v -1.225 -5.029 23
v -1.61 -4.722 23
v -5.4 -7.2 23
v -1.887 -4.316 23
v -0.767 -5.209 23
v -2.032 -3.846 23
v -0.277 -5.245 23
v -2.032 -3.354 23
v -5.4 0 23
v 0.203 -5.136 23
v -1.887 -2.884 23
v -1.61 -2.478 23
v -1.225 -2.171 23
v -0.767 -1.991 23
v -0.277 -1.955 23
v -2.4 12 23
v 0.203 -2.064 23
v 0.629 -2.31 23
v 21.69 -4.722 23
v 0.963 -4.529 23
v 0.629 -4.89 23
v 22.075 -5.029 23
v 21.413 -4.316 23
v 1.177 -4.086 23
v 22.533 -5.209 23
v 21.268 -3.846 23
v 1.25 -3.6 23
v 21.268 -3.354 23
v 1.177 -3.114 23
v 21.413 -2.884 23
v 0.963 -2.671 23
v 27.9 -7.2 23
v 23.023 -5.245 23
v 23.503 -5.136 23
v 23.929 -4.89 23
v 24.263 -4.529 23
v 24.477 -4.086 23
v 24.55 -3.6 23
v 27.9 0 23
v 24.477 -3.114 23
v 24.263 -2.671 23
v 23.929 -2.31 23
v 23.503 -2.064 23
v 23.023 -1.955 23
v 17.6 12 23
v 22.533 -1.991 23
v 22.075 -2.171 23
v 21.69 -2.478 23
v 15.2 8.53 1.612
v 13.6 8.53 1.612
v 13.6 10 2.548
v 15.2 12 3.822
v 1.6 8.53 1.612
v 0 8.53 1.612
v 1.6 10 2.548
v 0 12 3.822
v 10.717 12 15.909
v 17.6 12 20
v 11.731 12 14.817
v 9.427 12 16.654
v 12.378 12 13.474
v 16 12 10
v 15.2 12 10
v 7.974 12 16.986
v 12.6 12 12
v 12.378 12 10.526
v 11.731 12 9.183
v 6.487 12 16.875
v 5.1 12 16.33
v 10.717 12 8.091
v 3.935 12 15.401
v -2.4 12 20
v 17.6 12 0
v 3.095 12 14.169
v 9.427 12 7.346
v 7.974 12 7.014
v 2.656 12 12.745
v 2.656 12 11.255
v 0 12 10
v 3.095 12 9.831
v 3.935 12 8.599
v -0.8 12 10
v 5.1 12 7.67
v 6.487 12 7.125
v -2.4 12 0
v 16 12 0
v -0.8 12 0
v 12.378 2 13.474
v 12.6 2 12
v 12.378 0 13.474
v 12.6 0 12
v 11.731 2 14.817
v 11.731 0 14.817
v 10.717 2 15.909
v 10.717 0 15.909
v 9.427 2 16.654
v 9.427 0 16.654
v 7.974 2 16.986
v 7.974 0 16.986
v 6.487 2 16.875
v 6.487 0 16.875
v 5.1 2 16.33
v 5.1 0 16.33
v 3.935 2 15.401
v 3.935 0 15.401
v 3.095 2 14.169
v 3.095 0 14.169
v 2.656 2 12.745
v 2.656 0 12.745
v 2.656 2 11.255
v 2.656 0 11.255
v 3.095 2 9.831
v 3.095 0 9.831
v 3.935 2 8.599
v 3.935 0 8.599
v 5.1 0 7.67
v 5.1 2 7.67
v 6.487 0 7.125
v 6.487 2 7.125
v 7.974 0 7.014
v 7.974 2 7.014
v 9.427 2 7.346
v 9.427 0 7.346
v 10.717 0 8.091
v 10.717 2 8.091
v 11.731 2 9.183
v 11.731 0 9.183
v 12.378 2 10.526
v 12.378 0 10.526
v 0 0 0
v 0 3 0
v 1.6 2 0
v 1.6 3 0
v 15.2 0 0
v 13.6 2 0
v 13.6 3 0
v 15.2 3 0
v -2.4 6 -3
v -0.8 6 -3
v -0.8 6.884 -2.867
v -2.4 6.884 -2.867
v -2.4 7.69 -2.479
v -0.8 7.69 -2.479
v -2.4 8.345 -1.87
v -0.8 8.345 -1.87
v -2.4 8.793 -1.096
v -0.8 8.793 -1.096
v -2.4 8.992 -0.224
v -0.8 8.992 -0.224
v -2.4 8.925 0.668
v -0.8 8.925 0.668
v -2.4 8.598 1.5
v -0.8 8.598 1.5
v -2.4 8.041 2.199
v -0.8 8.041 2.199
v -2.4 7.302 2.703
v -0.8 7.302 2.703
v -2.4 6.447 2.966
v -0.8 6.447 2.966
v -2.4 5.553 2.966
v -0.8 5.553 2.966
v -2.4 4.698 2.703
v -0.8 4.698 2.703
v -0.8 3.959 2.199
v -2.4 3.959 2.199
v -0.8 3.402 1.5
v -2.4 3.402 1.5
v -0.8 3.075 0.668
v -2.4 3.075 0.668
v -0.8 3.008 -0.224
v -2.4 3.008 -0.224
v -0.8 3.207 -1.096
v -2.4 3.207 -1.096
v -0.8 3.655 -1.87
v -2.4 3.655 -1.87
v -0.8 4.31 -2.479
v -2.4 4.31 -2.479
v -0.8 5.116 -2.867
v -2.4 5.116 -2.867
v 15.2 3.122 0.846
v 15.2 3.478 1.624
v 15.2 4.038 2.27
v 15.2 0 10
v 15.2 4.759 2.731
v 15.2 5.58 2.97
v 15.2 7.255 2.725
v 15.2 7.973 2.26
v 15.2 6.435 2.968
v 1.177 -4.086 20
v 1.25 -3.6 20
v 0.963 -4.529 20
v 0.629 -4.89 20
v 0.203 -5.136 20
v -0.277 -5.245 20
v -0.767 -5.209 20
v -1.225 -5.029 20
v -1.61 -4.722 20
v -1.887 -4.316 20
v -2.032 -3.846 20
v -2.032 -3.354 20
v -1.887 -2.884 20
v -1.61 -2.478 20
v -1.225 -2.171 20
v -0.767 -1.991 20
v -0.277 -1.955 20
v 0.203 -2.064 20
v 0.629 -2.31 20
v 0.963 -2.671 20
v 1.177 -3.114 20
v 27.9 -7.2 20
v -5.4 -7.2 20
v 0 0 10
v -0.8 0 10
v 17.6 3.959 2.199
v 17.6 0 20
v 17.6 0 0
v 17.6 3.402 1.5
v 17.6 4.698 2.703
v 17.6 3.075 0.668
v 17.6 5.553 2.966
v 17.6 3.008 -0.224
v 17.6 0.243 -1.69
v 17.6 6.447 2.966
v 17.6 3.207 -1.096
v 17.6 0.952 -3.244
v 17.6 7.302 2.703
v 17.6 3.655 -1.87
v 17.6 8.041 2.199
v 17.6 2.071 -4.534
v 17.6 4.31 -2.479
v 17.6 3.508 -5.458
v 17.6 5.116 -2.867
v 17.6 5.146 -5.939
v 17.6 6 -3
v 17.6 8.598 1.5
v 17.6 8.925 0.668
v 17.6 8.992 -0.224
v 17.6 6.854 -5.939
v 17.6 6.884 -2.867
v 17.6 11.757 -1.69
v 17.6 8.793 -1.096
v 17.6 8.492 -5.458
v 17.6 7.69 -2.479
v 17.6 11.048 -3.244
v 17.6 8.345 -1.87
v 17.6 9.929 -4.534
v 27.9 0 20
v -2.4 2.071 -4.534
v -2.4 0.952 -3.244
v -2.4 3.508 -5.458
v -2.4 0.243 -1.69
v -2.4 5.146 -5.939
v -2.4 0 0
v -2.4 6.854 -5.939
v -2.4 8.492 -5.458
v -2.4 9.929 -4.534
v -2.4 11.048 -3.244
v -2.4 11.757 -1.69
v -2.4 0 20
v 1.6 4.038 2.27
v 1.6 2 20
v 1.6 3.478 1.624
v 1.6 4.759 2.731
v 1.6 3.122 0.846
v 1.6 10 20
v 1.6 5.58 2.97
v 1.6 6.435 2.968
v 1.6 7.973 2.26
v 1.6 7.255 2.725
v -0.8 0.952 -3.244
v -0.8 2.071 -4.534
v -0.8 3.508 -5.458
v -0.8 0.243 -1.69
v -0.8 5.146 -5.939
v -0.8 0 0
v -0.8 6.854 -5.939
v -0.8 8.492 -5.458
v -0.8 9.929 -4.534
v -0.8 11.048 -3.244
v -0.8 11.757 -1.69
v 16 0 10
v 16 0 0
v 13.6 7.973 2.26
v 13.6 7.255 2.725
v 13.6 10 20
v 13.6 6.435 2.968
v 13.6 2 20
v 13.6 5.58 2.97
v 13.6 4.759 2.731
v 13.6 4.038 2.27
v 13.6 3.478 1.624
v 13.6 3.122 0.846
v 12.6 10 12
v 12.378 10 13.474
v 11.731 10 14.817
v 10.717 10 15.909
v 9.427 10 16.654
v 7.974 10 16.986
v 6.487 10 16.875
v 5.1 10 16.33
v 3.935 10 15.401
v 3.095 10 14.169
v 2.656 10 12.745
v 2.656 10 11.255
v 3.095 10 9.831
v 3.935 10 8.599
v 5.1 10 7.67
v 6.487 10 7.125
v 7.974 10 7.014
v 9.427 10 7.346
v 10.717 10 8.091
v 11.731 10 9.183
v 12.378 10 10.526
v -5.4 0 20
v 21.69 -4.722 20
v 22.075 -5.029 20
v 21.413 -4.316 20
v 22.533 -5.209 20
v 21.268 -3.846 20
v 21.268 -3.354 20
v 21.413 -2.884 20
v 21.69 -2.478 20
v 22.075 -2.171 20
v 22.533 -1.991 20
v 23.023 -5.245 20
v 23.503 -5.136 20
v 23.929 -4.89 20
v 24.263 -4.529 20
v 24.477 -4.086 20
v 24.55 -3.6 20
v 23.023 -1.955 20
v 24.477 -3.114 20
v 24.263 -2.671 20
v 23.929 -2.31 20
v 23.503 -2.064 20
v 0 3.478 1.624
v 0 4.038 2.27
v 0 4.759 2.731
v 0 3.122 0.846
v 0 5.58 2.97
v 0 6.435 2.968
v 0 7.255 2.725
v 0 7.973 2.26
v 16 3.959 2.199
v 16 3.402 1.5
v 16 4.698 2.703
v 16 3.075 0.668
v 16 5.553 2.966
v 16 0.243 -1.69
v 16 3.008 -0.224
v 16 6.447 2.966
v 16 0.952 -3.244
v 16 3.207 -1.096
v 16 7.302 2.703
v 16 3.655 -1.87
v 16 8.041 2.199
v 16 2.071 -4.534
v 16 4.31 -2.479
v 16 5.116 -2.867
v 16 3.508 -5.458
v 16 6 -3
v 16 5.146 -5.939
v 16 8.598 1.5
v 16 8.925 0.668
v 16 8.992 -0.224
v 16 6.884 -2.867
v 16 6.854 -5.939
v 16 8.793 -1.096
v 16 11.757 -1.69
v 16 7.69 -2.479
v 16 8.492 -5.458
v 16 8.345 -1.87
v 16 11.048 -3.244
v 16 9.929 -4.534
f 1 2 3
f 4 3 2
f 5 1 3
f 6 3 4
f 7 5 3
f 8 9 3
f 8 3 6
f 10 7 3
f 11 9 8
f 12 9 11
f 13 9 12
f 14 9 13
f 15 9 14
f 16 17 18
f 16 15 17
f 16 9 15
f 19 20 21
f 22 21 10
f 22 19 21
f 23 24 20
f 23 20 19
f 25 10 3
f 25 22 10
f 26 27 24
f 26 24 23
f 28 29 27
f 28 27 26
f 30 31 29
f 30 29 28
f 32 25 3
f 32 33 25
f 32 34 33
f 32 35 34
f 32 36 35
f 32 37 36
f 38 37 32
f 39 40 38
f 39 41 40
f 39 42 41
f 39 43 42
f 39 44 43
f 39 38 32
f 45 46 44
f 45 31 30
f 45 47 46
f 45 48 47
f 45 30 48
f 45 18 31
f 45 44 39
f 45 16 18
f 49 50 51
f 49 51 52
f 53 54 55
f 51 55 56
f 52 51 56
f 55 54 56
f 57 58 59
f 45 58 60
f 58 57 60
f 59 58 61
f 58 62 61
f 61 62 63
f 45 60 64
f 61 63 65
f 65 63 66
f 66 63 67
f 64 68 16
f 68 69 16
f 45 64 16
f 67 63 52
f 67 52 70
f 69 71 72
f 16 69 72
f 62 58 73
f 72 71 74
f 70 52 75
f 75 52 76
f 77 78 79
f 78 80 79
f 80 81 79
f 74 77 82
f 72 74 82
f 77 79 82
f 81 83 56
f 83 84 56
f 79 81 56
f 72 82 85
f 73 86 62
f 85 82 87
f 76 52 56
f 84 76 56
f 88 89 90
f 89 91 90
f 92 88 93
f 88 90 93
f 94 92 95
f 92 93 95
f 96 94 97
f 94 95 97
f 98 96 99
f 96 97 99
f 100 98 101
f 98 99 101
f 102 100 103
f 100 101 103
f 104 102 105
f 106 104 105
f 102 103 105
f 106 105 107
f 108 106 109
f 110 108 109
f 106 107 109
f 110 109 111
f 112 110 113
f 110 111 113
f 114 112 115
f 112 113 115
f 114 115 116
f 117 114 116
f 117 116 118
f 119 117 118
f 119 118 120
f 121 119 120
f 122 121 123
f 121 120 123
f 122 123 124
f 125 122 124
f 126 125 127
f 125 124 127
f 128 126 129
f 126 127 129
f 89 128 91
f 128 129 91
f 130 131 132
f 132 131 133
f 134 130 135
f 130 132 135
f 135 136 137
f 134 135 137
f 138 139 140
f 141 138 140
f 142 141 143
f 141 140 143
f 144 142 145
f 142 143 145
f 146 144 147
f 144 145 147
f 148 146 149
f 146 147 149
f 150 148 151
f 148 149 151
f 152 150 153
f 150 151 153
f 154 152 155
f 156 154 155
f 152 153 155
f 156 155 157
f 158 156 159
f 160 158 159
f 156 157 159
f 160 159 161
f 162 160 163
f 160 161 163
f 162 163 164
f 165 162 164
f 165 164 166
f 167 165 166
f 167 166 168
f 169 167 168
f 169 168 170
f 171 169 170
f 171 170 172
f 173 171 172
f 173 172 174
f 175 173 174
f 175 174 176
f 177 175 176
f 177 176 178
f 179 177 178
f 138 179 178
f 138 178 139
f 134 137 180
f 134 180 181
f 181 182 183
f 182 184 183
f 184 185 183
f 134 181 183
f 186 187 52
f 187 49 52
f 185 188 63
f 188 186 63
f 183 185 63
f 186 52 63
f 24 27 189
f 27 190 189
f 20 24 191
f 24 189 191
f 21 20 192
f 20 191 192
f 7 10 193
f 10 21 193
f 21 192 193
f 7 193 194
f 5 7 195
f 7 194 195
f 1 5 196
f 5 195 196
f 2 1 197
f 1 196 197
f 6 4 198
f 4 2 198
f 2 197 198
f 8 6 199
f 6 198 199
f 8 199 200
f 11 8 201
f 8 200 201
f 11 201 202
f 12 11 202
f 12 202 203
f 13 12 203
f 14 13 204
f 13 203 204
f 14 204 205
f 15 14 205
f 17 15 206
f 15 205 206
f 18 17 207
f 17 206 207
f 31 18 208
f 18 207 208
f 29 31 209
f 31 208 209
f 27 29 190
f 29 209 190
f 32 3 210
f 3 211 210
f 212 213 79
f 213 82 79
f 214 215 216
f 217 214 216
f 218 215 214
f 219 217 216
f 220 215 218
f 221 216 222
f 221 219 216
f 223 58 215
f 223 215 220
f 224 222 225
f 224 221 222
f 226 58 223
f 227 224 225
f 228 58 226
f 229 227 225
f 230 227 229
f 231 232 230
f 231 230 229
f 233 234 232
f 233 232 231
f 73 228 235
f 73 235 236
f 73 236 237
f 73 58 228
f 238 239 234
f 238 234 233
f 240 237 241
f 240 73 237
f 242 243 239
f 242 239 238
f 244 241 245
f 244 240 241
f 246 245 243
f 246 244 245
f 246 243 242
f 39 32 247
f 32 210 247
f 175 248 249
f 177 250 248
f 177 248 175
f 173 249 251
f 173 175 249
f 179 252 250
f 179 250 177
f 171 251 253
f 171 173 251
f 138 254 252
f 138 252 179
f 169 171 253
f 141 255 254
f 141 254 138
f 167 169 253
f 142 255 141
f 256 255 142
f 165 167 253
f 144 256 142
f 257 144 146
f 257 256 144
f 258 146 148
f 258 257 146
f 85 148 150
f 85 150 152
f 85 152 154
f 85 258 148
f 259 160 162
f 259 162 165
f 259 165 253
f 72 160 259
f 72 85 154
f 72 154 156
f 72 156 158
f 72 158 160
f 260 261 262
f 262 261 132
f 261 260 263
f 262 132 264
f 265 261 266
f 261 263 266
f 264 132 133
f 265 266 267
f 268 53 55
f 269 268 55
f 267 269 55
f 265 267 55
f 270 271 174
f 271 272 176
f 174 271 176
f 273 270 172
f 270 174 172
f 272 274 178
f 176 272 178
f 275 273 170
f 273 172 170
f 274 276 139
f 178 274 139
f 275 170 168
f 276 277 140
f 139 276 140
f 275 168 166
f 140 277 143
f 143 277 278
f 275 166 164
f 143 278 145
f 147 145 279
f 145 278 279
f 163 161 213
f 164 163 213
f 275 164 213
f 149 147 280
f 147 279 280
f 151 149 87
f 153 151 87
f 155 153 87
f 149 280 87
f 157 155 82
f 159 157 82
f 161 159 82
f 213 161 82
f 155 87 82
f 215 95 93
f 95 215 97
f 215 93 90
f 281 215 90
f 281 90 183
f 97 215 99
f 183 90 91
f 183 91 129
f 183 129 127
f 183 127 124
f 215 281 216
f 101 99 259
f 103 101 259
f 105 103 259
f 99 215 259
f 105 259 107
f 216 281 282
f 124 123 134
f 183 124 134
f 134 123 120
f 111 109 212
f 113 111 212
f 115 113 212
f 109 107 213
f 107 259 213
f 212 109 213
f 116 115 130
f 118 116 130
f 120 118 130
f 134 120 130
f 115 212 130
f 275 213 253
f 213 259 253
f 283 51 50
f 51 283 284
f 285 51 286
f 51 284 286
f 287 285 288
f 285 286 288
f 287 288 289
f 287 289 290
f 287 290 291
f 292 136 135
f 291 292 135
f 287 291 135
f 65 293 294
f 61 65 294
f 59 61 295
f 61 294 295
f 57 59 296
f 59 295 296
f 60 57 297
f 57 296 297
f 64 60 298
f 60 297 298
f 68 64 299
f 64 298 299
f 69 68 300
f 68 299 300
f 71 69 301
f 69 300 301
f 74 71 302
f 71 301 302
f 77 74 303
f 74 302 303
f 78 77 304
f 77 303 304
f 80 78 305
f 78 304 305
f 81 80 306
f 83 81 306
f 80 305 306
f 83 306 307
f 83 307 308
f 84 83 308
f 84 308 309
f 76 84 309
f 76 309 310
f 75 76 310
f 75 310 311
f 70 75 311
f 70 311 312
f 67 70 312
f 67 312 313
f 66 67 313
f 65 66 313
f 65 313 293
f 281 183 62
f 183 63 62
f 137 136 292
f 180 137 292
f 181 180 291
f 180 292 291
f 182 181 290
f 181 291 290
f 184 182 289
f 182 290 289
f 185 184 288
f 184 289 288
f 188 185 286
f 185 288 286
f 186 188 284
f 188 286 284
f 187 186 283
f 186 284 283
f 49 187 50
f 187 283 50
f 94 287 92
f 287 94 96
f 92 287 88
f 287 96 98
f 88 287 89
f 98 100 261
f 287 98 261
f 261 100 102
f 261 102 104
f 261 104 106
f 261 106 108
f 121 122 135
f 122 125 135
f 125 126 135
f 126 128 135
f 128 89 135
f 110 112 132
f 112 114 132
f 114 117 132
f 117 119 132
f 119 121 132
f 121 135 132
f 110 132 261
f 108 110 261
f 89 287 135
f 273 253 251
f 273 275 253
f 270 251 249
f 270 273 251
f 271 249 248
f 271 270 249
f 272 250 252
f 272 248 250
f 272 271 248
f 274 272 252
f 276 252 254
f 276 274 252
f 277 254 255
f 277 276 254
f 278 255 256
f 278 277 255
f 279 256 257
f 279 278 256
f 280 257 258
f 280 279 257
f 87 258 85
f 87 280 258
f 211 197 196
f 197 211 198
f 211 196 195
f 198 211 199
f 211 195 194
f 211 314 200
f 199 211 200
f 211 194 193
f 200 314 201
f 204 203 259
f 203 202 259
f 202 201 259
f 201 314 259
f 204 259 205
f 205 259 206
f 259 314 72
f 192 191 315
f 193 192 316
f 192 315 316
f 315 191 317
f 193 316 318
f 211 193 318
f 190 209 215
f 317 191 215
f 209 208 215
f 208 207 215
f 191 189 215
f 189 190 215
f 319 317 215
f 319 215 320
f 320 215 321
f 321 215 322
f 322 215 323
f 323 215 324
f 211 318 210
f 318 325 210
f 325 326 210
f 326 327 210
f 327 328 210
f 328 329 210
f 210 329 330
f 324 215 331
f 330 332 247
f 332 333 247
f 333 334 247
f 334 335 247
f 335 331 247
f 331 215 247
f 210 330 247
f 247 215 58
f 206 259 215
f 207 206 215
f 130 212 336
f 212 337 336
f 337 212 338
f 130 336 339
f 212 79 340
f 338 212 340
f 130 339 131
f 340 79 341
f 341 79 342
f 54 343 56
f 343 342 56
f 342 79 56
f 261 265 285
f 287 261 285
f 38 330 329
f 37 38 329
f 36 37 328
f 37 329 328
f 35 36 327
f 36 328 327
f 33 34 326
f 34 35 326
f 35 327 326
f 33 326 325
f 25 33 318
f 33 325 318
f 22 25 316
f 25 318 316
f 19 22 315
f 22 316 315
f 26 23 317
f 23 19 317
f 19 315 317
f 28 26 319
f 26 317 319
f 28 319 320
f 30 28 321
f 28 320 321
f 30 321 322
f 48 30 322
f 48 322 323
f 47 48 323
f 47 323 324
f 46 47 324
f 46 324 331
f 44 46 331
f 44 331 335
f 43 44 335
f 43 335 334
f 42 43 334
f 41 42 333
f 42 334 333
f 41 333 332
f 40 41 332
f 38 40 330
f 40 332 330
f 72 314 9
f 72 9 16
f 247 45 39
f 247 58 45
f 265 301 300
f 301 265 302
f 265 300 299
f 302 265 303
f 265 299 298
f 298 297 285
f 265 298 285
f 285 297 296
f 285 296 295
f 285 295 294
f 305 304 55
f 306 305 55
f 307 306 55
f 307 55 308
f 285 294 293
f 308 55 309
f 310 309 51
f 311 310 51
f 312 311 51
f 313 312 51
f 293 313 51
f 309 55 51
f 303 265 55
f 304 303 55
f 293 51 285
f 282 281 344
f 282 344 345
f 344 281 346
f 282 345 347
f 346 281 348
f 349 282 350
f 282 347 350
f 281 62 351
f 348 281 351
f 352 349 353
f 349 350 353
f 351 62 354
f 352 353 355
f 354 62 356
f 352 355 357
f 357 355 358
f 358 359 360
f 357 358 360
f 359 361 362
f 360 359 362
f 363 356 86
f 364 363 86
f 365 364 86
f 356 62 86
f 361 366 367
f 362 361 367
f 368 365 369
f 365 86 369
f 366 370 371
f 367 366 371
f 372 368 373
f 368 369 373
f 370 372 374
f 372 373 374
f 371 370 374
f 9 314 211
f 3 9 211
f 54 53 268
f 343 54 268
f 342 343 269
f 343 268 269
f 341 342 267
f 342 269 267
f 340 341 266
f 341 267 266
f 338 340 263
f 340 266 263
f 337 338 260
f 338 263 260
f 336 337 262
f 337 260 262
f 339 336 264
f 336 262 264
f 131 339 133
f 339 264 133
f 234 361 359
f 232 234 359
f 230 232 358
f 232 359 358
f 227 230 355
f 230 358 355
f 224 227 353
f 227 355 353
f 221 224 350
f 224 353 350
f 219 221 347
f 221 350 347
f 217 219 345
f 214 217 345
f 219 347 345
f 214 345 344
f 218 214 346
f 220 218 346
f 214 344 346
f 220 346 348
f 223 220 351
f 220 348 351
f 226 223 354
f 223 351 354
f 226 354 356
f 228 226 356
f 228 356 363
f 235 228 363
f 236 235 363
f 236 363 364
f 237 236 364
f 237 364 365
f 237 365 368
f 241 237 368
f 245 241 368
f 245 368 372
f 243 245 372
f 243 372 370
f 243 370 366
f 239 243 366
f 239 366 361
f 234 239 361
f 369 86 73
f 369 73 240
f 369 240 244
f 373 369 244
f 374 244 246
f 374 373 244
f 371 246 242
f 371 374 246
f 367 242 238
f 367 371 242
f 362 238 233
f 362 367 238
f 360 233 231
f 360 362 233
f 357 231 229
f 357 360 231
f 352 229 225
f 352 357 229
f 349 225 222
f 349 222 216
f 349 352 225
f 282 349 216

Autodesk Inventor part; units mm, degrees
ref_plane "YZ Plane" through (0, 0, 0) normal (1, 0, 0) x (0, 1, 0)
ref_plane "XZ Plane" through (0, 0, 0) normal (0, 1, 0) x (-1, 0, 0)
sketch "Sketch1" plane through (0, 0, 0) normal (0, 0, 1) x (1, 0, 0)
  line L0 (0, 0) -> (15.2, 0)
  line L1 (15.2, 0) -> (15.2, 12)
  line L2 (15.2, 12) -> (0, 12)
  line L3 (0, 12) -> (0, 0)
  line L4 (1.6, 10) -> (13.6, 10)
  line L5 (13.6, 10) -> (13.6, 2)
  line L6 (13.6, 2) -> (1.6, 2)
  line L7 (1.6, 2) -> (1.6, 10)
  dimension "d0" = 15.2
  dimension "d1" = 12
  dimension "d2" = 1.6
  dimension "d3" = 2
  dimension "d4" = 2
  dimension "d5" = 1.6
extrude "Extrusion1" add sketch "Sketch1" along normal blind 20
sketch "Sketch2" plane through (0, 0, 0) normal (1, 0, 0) x (0, 1, 0)
  line L0 (0, 0) -> (12, 0) construction
  line L1 (6, 13.0663) -> (6, -2.0093) construction
  line L2 (0, 0) -> (0, 20) construction
  line L3 (12, 0) -> (12, 20) construction
  line L4 (6, 0) -> (12, 3.8224)
  line L5 (12, 3.8224) -> (12, 0)
  line L6 (12, 0) -> (6, 0)
  dimension "d8" = 12
  dimension "d9" = 6
  dimension "d10" = 32.5
extrude "Extrusion2" cut sketch "Sketch2" along normal through all
sketch "Sketch9" plane through (0, 0, 20) normal (-1, 0, 0) x (0, 0, 1)
  line L0 (-20, 0) -> (0, 0) construction
  line L1 (0, 12) -> (0, 0) construction
  line L2 (-16.1776, 12) -> (0, 12) construction
  line L3 (-20, 0) -> (-20, 14.5103) construction
  line L4 (-20, 0) -> (0, 0)
  line L5 (0, 12) -> (0, 0)
  line L6 (0, 12) -> (-20, 12)
  arc A0 (-20, 12) -> (-20, 0) centre (-20, 6) ccw
extrude "Extrusion8" add sketch "Sketch9" along normal blind 2.4
sketch "Sketch4" plane through (1.6, 2, 20) normal (1, 0, 0) x (0, 0, -1)
  circle A0 centre (20, 4) radius 3
  point P0 (20, -2)
  dimension "d14" = 6
extrude "Extrusion3" cut sketch "Sketch4" along normal through all both and the other way through all
sketch "Sketch11" plane through (15.2, 12, 20) normal (0, 1, 0) x (1, 0, 0)
  line L0 (0, 0) -> (-17.6, 0) construction
  line L1 (-15.2, 26) -> (-15.2, 20) construction
  line L2 (-15.2, 26) -> (-16, 26)
  line L3 (-16, 26) -> (-16, 10)
  line L4 (-16, 10) -> (-15.2, 10)
  line L5 (-15.2, 10) -> (-15.2, 26)
  line L6 (-15.2, 20) -> (-13.6, 20) construction
  dimension "d38" = 10
  dimension "d39" = 0.8
extrude "Extrusion9" cut sketch "Sketch11" against normal through all
ref_plane "Work Plane4" through (7.6, 2, 20) normal (-1, 0, 0) x (0, 0, 1)
mirror "Mirror3" about plane through (7.6, 2, 20) normal (-1, 0, 0) of "Extrusion8", "Extrusion3", "Extrusion9"
sketch "Sketch14" plane through (0, 0, 20) normal (0, 0, 1) x (1, 0, 0)
  line L0 (17.6, 0) -> (-2.4, 0) construction
  line L1 (-2.4, 12) -> (17.6, 12) construction
  line L2 (-5.4, 0) -> (-5.4, -7.2)
  line L3 (-5.4, -7.2) -> (27.9, -7.2)
  line L4 (27.9, -7.2) -> (27.9, 0)
  line L5 (17.6, 12) -> (-2.4, 12)
  line L6 (-5.4, -3.6) -> (27.9, -3.6) construction
  circle A0 centre (-0.4, -3.6) radius 1.65
  line L7 (7.6, 12) -> (7.6, -12.1697) construction
  circle A1 centre (22.9, -3.6) radius 1.65
  line L8 (-5.4, 0) -> (-2.4, 12)
  line L9 (17.6, 12) -> (27.9, 0)
  point P0 (0, 0)
  dimension "d54" = 7.2
  dimension "d55" = 3.3
  dimension "d56" = 8
  dimension "d57" = 15.3
  dimension "d58" = 5
  dimension "d59" = 5
extrude "Extrusion12" add sketch "Sketch14" along normal blind 3
sketch "Sketch15" plane through (-2.4, 0, 0) normal (0, -1, 0) x (1, 0, 0)
  line L0 (2.4, 0) -> (17.6, 0) construction
  line L1 (17.6, 10) -> (18.4, 10) construction
  line L2 (10, 0) -> (10, 23.7385) construction
  circle A0 centre (10, 12) radius 5
  dimension "d62" = 10
  dimension "d63" = 12
extrude "Extrusion13" cut sketch "Sketch15" against normal through all
equation "\"d9\" = 0.5 * d8"
properties part number "chain_end_extruder"
